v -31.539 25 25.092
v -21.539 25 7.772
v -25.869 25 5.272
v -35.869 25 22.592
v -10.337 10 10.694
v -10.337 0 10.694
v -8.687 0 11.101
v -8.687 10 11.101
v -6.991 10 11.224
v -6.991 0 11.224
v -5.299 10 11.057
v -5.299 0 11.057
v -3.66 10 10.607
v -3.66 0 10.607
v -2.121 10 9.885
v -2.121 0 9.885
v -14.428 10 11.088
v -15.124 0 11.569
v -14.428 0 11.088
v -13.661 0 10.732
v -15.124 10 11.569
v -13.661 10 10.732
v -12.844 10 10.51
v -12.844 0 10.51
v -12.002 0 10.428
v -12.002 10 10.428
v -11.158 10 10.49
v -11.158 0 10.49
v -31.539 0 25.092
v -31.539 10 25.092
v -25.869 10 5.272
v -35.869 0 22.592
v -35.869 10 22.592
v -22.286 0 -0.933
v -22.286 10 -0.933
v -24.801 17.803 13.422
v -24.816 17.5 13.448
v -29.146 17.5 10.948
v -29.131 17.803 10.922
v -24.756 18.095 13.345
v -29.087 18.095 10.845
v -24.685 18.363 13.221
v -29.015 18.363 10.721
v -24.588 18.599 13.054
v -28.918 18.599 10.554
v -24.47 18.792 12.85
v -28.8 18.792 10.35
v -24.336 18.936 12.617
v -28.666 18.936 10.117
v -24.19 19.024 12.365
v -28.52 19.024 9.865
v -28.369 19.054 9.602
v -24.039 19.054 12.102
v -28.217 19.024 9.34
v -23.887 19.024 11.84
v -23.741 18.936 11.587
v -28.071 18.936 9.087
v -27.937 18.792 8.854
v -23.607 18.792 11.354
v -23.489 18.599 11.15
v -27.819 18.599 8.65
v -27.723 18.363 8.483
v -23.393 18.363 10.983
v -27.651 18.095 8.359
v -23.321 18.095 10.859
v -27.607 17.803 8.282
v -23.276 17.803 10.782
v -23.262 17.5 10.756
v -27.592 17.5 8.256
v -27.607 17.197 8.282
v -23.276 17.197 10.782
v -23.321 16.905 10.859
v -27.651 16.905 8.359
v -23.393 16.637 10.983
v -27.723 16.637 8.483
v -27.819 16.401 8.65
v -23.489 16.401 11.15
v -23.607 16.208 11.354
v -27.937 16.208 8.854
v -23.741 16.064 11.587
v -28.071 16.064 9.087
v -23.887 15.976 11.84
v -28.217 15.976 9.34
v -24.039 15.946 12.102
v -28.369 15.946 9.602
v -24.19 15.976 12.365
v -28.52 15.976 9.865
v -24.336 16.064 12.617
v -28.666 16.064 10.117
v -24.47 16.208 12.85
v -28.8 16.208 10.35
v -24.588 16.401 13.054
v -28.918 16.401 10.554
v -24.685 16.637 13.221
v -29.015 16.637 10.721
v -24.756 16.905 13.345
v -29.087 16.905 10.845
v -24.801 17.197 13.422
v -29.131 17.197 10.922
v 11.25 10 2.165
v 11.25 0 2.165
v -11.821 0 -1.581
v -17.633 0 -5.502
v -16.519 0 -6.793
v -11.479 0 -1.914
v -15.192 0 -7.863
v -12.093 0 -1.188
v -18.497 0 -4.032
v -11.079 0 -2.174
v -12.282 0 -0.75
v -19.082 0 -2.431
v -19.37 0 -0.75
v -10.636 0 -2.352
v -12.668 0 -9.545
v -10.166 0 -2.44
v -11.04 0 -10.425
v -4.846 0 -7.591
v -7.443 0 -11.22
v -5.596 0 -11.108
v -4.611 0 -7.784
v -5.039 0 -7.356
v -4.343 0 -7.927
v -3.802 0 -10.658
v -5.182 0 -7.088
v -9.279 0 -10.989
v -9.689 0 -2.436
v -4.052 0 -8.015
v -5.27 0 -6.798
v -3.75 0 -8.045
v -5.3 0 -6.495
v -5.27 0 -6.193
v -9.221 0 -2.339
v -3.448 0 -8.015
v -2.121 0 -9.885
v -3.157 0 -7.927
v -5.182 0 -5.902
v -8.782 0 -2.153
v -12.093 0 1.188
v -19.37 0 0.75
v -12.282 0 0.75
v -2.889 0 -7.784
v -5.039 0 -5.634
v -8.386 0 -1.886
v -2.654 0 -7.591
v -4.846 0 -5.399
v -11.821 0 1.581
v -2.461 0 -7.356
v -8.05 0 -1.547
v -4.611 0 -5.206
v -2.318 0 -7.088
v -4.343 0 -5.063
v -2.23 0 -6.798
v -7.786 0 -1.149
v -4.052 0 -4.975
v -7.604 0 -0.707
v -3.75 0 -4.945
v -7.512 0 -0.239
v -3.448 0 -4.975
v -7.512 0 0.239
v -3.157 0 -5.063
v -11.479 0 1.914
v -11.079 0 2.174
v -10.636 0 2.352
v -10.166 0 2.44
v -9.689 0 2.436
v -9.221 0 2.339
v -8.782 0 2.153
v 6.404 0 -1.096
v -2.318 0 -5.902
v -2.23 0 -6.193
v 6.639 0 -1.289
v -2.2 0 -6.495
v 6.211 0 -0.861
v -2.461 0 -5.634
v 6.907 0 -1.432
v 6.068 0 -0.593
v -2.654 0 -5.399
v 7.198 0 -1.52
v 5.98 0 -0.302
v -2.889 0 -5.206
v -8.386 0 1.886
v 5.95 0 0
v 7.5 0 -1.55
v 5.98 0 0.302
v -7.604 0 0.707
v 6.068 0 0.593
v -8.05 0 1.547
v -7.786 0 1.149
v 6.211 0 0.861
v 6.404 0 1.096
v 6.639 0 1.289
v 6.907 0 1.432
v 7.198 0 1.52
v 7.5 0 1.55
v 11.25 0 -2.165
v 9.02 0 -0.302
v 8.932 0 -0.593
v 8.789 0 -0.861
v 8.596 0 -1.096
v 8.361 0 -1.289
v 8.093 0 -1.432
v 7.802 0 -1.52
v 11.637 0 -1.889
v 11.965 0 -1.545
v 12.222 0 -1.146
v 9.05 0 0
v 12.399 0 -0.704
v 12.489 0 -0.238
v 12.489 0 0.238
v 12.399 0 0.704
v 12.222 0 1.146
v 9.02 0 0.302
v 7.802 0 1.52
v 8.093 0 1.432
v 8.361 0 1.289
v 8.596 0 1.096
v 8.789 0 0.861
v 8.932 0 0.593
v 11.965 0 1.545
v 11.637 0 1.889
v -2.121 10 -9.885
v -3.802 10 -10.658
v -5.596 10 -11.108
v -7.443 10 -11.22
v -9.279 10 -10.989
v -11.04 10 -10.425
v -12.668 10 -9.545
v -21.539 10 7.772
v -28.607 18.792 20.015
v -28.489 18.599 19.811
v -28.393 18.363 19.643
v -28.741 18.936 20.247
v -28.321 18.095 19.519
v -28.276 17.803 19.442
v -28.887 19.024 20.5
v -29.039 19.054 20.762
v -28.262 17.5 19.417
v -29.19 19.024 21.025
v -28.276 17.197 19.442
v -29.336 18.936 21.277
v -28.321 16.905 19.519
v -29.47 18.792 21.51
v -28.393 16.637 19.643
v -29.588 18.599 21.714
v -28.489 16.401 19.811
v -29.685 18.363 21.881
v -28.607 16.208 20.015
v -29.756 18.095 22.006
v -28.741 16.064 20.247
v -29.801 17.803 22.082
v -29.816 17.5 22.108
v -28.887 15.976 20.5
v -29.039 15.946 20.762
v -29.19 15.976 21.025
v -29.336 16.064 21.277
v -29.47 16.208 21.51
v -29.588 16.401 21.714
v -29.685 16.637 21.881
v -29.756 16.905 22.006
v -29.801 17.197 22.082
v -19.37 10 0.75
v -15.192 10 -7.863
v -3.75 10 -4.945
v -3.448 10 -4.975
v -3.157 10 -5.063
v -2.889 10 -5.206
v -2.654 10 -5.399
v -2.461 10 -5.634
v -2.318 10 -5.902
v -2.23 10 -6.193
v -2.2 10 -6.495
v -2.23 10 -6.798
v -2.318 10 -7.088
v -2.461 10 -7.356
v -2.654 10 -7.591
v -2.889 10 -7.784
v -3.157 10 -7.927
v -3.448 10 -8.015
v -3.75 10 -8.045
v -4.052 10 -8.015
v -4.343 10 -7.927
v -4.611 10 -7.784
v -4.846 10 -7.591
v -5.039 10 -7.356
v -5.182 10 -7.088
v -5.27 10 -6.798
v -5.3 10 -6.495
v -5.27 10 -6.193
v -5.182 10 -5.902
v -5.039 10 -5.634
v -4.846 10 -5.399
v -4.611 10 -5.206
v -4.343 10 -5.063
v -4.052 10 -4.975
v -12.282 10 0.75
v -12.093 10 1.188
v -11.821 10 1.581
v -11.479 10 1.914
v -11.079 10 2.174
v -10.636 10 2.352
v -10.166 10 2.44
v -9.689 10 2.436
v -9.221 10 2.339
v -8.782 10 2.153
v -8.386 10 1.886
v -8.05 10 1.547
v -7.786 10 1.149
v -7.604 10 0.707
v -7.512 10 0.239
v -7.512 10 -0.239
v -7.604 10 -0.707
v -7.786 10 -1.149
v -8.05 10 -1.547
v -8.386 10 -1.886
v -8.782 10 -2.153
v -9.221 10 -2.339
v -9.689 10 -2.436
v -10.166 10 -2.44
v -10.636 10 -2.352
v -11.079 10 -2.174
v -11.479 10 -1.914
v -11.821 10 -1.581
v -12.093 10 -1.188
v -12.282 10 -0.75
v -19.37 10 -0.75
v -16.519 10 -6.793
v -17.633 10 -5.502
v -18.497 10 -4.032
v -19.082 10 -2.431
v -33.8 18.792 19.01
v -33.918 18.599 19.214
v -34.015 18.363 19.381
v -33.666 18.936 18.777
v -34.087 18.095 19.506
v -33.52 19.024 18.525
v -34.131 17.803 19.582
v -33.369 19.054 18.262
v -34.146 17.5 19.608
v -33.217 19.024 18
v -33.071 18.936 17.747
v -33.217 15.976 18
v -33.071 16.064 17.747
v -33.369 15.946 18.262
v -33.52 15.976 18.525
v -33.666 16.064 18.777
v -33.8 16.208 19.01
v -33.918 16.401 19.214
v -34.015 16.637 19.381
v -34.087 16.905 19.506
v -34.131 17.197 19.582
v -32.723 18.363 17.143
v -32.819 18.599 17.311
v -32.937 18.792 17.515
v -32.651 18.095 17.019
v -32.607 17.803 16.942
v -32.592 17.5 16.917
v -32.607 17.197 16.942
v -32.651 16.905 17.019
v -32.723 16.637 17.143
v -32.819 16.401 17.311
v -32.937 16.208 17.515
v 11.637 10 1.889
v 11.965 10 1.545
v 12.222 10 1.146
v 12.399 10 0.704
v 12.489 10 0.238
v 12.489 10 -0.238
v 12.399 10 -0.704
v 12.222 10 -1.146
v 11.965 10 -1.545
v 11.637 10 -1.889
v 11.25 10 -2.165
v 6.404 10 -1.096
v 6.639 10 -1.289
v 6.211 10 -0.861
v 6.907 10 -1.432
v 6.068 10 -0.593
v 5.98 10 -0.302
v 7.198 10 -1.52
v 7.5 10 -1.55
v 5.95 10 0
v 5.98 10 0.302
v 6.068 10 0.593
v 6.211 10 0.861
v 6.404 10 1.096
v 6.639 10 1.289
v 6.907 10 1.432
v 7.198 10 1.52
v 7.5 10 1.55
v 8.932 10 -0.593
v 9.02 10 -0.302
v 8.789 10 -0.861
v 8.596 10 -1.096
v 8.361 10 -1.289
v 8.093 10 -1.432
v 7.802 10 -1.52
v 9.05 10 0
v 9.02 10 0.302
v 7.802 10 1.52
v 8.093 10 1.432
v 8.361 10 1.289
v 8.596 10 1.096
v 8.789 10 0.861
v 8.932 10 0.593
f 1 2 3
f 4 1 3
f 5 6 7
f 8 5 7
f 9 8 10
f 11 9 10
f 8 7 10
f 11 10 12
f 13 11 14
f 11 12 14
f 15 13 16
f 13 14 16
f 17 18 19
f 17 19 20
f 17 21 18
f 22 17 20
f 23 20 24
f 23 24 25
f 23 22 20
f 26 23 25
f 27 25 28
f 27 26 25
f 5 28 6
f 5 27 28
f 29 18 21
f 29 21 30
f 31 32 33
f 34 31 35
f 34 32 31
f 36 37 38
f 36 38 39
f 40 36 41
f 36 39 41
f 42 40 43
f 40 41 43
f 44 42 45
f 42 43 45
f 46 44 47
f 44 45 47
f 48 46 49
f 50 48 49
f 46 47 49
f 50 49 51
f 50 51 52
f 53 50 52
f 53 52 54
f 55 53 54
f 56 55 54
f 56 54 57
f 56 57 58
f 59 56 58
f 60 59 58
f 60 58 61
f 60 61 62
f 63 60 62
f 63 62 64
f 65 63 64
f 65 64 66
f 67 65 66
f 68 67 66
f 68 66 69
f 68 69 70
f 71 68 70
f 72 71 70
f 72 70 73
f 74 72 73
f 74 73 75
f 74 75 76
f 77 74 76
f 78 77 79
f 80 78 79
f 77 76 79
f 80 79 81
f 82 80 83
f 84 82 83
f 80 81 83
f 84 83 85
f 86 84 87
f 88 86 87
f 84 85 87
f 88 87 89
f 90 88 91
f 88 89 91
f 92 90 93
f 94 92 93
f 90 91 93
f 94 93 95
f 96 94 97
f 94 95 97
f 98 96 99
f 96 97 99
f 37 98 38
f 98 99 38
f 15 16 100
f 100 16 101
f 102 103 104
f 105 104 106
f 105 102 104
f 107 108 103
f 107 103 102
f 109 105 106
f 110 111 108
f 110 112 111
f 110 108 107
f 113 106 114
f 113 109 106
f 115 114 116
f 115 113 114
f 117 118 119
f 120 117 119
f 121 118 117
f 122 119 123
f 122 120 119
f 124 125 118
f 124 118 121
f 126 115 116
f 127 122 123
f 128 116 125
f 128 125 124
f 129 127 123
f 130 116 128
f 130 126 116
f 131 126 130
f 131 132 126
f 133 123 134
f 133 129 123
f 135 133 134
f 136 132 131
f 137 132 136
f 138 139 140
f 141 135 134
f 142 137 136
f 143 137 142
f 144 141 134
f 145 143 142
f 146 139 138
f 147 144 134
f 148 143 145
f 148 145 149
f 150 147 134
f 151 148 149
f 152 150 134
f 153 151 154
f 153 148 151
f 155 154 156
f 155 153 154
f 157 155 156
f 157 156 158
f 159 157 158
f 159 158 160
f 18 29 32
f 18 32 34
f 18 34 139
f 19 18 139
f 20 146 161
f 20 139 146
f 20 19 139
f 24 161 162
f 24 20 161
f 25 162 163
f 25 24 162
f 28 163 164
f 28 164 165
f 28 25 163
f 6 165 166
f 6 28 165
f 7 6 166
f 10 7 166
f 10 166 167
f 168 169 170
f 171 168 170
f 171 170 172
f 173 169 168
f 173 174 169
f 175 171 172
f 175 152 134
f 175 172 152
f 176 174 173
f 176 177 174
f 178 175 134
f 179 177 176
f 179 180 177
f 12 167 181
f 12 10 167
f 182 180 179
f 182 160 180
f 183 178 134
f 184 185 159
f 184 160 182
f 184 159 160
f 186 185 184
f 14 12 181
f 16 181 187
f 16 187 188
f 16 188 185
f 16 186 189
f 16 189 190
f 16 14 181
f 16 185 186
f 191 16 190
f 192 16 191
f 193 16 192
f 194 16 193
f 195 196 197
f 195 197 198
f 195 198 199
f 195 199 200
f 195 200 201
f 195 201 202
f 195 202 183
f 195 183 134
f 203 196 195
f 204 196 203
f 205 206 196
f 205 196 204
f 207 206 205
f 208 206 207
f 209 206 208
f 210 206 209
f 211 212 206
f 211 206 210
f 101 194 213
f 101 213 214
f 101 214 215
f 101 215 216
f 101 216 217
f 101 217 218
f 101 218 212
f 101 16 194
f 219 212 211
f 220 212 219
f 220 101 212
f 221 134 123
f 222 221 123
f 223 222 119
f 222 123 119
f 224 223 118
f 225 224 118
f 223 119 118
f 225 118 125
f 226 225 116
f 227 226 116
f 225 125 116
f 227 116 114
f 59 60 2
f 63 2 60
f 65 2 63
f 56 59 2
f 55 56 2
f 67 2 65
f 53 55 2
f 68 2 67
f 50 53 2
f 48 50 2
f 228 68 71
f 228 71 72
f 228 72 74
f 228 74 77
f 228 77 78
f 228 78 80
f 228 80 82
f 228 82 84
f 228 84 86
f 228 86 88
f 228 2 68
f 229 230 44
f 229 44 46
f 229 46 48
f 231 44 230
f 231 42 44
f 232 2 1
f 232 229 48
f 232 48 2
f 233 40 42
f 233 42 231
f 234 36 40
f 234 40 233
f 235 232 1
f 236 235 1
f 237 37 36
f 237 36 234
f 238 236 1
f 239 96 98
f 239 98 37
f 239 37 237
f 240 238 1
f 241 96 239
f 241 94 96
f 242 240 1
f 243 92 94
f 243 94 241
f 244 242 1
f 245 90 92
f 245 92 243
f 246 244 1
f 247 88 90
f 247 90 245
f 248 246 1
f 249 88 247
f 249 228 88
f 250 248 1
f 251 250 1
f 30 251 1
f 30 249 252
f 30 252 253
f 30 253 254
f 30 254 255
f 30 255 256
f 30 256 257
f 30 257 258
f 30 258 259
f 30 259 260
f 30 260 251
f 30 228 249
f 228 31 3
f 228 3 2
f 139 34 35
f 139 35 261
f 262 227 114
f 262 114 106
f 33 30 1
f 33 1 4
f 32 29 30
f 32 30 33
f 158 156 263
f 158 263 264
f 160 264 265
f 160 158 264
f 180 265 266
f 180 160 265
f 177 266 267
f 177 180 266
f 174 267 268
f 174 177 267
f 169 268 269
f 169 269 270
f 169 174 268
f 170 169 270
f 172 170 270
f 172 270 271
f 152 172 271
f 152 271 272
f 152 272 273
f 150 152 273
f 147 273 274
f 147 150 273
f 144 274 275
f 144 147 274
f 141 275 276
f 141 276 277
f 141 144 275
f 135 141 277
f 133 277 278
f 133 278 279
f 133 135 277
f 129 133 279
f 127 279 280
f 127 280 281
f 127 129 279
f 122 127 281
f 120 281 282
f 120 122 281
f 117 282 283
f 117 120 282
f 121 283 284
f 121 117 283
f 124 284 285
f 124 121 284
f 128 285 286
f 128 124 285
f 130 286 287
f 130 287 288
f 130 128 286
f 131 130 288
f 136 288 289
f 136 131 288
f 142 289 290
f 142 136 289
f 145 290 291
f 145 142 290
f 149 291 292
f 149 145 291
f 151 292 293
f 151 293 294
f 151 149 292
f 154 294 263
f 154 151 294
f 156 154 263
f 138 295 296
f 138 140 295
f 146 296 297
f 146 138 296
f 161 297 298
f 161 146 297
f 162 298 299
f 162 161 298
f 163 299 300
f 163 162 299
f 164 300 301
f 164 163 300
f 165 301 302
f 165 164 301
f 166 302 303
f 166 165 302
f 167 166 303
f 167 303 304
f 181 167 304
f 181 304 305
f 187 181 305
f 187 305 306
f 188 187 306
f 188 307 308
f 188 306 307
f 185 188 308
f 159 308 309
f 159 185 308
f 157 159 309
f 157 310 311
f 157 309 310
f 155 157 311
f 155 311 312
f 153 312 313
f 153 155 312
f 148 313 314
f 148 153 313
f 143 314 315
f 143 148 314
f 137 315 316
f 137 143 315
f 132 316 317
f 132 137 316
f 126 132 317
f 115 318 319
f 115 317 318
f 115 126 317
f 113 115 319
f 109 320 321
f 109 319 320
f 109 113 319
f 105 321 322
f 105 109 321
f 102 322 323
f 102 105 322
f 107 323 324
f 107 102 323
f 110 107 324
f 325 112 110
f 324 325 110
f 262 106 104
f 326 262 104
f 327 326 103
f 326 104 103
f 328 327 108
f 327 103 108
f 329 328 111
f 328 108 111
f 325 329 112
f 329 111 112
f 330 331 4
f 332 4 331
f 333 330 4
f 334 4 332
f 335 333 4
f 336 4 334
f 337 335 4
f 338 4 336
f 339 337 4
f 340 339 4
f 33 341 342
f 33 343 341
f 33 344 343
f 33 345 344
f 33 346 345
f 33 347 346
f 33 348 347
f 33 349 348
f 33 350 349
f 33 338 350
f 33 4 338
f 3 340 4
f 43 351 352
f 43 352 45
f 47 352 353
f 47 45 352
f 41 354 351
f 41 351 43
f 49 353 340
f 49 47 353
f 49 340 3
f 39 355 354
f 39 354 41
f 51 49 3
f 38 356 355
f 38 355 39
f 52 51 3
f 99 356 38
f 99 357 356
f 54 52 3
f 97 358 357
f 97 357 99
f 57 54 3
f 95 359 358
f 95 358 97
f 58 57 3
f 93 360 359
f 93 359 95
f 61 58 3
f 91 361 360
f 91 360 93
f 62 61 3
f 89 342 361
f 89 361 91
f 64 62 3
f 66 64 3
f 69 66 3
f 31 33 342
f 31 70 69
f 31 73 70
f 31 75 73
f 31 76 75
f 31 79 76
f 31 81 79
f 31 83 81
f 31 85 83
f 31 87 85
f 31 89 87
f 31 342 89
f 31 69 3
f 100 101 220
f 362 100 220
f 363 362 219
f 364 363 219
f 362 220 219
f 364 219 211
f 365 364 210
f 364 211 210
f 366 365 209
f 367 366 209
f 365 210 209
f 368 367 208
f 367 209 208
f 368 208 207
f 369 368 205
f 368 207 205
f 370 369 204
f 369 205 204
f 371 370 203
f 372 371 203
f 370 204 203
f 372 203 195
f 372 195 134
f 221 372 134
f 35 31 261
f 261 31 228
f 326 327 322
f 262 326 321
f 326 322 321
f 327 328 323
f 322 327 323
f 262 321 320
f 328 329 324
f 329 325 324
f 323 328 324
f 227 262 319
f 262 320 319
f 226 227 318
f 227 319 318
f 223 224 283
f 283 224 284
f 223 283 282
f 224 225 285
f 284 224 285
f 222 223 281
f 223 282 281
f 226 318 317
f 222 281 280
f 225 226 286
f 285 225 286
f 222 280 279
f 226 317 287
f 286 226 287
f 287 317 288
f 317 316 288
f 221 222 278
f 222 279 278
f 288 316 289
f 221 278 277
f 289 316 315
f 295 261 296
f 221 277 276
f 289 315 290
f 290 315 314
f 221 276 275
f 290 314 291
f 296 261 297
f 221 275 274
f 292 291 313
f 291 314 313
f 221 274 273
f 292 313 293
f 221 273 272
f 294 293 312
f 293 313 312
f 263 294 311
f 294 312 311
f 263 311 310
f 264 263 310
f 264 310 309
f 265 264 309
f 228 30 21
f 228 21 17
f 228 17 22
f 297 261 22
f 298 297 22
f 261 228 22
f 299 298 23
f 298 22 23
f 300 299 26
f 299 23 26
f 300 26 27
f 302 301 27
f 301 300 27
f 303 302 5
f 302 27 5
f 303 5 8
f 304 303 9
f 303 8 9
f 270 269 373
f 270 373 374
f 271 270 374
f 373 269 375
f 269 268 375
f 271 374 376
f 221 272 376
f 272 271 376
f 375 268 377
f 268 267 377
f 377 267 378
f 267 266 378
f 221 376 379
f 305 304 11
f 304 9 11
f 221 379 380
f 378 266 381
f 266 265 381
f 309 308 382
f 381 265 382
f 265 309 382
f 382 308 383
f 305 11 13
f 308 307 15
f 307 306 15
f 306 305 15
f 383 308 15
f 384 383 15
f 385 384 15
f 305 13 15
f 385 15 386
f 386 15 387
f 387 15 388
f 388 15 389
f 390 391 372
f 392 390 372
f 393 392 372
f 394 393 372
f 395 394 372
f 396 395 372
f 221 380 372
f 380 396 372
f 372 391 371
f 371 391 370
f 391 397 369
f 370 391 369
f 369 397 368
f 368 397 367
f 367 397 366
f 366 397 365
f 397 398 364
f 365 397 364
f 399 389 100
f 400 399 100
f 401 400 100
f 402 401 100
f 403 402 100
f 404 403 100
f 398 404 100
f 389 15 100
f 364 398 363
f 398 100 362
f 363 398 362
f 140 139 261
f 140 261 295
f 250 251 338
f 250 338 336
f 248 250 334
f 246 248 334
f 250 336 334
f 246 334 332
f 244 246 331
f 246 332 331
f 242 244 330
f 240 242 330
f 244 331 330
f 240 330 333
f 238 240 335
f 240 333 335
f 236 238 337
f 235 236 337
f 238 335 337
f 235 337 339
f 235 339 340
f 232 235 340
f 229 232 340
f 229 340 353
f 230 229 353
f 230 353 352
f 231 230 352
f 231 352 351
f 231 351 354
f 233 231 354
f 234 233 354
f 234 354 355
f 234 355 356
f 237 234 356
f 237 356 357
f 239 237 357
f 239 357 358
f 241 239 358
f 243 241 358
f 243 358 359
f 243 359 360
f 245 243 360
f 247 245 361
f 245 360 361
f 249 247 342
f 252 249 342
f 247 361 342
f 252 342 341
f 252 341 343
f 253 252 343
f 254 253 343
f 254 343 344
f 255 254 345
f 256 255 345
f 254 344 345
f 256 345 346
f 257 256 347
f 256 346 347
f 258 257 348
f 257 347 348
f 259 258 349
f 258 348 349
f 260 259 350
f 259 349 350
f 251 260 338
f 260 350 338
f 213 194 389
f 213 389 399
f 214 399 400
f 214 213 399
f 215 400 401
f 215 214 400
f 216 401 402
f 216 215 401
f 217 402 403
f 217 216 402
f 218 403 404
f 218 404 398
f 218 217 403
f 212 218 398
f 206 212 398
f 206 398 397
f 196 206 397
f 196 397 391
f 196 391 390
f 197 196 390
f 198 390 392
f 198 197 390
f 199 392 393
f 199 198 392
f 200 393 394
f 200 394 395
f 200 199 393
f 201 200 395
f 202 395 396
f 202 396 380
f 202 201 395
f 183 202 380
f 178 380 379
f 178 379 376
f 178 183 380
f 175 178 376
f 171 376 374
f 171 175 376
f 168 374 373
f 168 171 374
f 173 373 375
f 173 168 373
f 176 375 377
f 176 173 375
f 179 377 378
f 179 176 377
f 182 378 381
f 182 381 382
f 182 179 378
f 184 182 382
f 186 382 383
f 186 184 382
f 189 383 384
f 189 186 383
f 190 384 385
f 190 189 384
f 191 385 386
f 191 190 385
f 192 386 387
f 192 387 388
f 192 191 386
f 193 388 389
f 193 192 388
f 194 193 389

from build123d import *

# Parameters (mm, degrees)
SKETCH1_R                       = 1.55
SKETCH1_R_2                     = 2.45
BOSS_EXTRUDE1_DEPTH             = 10
SKETCH2_W                       = 9.45
SKETCH2_H                       = 1.5
CUT_EXTRUDE1_DEPTH              = 25.542893997
BOSS_EXTRUDE3_DEPTH             = 10
BOSS_EXTRUDE4_DEPTH             = 15
F_3_0MM_CLEARANCE_DOWEL_HOLE1_D = 3.108
FILLET1_R                       = 5


with BuildPart() as part:
    # Sketch1 → Boss-Extrude1 (new body)
    with BuildSketch(Plane(origin=(0, 0, 0), x_dir=(1, 0, 0), z_dir=(0, 1, 0))):
        with BuildLine():
            Line((11.25, 2.165063509), (-2.121223771, 9.884943153))
            ThreePointArc((-2.121223771, 9.884943153), (-7.442989886, 11.219511103), (-12.667897108, 9.545411133))
            Line((-12.667897108, 9.545411133), (-15.191606303, 7.863082307))
            ThreePointArc((-15.191606303, 7.863082307), (-19.4, 0), (-15.191606303, -7.863082307))
            Line((-15.191606303, -7.863082307), (-12.667897108, -9.545411133))
            ThreePointArc((-12.667897108, -9.545411133), (-7.442989886, -11.219511103), (-2.121223771, -9.884943153))
            Line((-2.121223771, -9.884943153), (11.25, -2.165063509))
            ThreePointArc((11.25, -2.165063509), (12.5, 0), (11.25, 2.165063509))
        make_face()
        with Locations(Location((7.5, 0, 0), (0, 0, 270))):
            Circle(SKETCH1_R, mode=Mode.SUBTRACT)
        with Locations(Location((-3.75, 6.495190528, 0), (0, 0, 270))):
            Circle(SKETCH1_R, mode=Mode.SUBTRACT)
        with Locations(Location((-9.95, 0, 0), (0, 0, 270))):
            Circle(SKETCH1_R_2, mode=Mode.SUBTRACT)
    extrude(amount=BOSS_EXTRUDE1_DEPTH)

    # Sketch2 → Cut-Extrude1 (cut, through all)
    with BuildSketch(Plane(origin=(0, 10, 0), x_dir=(1, 0, 0), z_dir=(0, 1, 0))):
        with Locations((-14.675, 0)):
            Rectangle(SKETCH2_W, SKETCH2_H)
    extrude(amount=-CUT_EXTRUDE1_DEPTH, mode=Mode.SUBTRACT)

    # Sketch3 → Boss-Extrude3 (add)
    with BuildSketch(Plane.XZ):
        with BuildLine():
            Line((-35.868683143, 22.59247598), (-22.285990587, -0.93343763))
            Line((-22.285990587, -0.93343763), (-19.370191081, 0.75))
            ThreePointArc((-19.370191081, 0.75), (-18.098070975, 4.786589536), (-15.191606303, 7.863082307))
            Line((-15.191606303, 7.863082307), (-12.667897108, 9.545411133))
            Line((-12.667897108, 9.545411133), (-31.538556124, 25.09247598))
            Line((-31.538556124, 25.09247598), (-35.868683143, 22.59247598))
        make_face()
    extrude(amount=-BOSS_EXTRUDE3_DEPTH)

    # Sketch4 → Boss-Extrude4 (add)
    with BuildSketch(Plane(origin=(0, 10, 0), x_dir=(1, 0, 0), z_dir=(0, 1, 0))):
        Polygon((-35.868683143, -22.59247598), (-25.868683143, -5.271967904), (-21.538556124, -7.771967904), (-31.538556124, -25.09247598), align=None)
    extrude(amount=BOSS_EXTRUDE4_DEPTH)

    # Ø3.0mm Clearance Dowel Hole1 (through all)
    with Locations(Plane(origin=(-12.788556272, 0, -7.383476406), x_dir=(0.5000000000000013, 0, -0.8660254037844379), z_dir=(0.8660254037844379, 0, 0.5000000000000013))):
        with Locations((-32.499999704, 17.5), (-22.499999704, 17.5)):
            Hole(F_3_0MM_CLEARANCE_DOWEL_HOLE1_D / 2)

    # Fillet1
    fillet1_edges = [part.edges().sort_by_distance(p)[0] for p in [
        (-12.667897108, 5, 9.545411133),
    ]]
    fillet(fillet1_edges, radius=FILLET1_R)


solid = part.part
